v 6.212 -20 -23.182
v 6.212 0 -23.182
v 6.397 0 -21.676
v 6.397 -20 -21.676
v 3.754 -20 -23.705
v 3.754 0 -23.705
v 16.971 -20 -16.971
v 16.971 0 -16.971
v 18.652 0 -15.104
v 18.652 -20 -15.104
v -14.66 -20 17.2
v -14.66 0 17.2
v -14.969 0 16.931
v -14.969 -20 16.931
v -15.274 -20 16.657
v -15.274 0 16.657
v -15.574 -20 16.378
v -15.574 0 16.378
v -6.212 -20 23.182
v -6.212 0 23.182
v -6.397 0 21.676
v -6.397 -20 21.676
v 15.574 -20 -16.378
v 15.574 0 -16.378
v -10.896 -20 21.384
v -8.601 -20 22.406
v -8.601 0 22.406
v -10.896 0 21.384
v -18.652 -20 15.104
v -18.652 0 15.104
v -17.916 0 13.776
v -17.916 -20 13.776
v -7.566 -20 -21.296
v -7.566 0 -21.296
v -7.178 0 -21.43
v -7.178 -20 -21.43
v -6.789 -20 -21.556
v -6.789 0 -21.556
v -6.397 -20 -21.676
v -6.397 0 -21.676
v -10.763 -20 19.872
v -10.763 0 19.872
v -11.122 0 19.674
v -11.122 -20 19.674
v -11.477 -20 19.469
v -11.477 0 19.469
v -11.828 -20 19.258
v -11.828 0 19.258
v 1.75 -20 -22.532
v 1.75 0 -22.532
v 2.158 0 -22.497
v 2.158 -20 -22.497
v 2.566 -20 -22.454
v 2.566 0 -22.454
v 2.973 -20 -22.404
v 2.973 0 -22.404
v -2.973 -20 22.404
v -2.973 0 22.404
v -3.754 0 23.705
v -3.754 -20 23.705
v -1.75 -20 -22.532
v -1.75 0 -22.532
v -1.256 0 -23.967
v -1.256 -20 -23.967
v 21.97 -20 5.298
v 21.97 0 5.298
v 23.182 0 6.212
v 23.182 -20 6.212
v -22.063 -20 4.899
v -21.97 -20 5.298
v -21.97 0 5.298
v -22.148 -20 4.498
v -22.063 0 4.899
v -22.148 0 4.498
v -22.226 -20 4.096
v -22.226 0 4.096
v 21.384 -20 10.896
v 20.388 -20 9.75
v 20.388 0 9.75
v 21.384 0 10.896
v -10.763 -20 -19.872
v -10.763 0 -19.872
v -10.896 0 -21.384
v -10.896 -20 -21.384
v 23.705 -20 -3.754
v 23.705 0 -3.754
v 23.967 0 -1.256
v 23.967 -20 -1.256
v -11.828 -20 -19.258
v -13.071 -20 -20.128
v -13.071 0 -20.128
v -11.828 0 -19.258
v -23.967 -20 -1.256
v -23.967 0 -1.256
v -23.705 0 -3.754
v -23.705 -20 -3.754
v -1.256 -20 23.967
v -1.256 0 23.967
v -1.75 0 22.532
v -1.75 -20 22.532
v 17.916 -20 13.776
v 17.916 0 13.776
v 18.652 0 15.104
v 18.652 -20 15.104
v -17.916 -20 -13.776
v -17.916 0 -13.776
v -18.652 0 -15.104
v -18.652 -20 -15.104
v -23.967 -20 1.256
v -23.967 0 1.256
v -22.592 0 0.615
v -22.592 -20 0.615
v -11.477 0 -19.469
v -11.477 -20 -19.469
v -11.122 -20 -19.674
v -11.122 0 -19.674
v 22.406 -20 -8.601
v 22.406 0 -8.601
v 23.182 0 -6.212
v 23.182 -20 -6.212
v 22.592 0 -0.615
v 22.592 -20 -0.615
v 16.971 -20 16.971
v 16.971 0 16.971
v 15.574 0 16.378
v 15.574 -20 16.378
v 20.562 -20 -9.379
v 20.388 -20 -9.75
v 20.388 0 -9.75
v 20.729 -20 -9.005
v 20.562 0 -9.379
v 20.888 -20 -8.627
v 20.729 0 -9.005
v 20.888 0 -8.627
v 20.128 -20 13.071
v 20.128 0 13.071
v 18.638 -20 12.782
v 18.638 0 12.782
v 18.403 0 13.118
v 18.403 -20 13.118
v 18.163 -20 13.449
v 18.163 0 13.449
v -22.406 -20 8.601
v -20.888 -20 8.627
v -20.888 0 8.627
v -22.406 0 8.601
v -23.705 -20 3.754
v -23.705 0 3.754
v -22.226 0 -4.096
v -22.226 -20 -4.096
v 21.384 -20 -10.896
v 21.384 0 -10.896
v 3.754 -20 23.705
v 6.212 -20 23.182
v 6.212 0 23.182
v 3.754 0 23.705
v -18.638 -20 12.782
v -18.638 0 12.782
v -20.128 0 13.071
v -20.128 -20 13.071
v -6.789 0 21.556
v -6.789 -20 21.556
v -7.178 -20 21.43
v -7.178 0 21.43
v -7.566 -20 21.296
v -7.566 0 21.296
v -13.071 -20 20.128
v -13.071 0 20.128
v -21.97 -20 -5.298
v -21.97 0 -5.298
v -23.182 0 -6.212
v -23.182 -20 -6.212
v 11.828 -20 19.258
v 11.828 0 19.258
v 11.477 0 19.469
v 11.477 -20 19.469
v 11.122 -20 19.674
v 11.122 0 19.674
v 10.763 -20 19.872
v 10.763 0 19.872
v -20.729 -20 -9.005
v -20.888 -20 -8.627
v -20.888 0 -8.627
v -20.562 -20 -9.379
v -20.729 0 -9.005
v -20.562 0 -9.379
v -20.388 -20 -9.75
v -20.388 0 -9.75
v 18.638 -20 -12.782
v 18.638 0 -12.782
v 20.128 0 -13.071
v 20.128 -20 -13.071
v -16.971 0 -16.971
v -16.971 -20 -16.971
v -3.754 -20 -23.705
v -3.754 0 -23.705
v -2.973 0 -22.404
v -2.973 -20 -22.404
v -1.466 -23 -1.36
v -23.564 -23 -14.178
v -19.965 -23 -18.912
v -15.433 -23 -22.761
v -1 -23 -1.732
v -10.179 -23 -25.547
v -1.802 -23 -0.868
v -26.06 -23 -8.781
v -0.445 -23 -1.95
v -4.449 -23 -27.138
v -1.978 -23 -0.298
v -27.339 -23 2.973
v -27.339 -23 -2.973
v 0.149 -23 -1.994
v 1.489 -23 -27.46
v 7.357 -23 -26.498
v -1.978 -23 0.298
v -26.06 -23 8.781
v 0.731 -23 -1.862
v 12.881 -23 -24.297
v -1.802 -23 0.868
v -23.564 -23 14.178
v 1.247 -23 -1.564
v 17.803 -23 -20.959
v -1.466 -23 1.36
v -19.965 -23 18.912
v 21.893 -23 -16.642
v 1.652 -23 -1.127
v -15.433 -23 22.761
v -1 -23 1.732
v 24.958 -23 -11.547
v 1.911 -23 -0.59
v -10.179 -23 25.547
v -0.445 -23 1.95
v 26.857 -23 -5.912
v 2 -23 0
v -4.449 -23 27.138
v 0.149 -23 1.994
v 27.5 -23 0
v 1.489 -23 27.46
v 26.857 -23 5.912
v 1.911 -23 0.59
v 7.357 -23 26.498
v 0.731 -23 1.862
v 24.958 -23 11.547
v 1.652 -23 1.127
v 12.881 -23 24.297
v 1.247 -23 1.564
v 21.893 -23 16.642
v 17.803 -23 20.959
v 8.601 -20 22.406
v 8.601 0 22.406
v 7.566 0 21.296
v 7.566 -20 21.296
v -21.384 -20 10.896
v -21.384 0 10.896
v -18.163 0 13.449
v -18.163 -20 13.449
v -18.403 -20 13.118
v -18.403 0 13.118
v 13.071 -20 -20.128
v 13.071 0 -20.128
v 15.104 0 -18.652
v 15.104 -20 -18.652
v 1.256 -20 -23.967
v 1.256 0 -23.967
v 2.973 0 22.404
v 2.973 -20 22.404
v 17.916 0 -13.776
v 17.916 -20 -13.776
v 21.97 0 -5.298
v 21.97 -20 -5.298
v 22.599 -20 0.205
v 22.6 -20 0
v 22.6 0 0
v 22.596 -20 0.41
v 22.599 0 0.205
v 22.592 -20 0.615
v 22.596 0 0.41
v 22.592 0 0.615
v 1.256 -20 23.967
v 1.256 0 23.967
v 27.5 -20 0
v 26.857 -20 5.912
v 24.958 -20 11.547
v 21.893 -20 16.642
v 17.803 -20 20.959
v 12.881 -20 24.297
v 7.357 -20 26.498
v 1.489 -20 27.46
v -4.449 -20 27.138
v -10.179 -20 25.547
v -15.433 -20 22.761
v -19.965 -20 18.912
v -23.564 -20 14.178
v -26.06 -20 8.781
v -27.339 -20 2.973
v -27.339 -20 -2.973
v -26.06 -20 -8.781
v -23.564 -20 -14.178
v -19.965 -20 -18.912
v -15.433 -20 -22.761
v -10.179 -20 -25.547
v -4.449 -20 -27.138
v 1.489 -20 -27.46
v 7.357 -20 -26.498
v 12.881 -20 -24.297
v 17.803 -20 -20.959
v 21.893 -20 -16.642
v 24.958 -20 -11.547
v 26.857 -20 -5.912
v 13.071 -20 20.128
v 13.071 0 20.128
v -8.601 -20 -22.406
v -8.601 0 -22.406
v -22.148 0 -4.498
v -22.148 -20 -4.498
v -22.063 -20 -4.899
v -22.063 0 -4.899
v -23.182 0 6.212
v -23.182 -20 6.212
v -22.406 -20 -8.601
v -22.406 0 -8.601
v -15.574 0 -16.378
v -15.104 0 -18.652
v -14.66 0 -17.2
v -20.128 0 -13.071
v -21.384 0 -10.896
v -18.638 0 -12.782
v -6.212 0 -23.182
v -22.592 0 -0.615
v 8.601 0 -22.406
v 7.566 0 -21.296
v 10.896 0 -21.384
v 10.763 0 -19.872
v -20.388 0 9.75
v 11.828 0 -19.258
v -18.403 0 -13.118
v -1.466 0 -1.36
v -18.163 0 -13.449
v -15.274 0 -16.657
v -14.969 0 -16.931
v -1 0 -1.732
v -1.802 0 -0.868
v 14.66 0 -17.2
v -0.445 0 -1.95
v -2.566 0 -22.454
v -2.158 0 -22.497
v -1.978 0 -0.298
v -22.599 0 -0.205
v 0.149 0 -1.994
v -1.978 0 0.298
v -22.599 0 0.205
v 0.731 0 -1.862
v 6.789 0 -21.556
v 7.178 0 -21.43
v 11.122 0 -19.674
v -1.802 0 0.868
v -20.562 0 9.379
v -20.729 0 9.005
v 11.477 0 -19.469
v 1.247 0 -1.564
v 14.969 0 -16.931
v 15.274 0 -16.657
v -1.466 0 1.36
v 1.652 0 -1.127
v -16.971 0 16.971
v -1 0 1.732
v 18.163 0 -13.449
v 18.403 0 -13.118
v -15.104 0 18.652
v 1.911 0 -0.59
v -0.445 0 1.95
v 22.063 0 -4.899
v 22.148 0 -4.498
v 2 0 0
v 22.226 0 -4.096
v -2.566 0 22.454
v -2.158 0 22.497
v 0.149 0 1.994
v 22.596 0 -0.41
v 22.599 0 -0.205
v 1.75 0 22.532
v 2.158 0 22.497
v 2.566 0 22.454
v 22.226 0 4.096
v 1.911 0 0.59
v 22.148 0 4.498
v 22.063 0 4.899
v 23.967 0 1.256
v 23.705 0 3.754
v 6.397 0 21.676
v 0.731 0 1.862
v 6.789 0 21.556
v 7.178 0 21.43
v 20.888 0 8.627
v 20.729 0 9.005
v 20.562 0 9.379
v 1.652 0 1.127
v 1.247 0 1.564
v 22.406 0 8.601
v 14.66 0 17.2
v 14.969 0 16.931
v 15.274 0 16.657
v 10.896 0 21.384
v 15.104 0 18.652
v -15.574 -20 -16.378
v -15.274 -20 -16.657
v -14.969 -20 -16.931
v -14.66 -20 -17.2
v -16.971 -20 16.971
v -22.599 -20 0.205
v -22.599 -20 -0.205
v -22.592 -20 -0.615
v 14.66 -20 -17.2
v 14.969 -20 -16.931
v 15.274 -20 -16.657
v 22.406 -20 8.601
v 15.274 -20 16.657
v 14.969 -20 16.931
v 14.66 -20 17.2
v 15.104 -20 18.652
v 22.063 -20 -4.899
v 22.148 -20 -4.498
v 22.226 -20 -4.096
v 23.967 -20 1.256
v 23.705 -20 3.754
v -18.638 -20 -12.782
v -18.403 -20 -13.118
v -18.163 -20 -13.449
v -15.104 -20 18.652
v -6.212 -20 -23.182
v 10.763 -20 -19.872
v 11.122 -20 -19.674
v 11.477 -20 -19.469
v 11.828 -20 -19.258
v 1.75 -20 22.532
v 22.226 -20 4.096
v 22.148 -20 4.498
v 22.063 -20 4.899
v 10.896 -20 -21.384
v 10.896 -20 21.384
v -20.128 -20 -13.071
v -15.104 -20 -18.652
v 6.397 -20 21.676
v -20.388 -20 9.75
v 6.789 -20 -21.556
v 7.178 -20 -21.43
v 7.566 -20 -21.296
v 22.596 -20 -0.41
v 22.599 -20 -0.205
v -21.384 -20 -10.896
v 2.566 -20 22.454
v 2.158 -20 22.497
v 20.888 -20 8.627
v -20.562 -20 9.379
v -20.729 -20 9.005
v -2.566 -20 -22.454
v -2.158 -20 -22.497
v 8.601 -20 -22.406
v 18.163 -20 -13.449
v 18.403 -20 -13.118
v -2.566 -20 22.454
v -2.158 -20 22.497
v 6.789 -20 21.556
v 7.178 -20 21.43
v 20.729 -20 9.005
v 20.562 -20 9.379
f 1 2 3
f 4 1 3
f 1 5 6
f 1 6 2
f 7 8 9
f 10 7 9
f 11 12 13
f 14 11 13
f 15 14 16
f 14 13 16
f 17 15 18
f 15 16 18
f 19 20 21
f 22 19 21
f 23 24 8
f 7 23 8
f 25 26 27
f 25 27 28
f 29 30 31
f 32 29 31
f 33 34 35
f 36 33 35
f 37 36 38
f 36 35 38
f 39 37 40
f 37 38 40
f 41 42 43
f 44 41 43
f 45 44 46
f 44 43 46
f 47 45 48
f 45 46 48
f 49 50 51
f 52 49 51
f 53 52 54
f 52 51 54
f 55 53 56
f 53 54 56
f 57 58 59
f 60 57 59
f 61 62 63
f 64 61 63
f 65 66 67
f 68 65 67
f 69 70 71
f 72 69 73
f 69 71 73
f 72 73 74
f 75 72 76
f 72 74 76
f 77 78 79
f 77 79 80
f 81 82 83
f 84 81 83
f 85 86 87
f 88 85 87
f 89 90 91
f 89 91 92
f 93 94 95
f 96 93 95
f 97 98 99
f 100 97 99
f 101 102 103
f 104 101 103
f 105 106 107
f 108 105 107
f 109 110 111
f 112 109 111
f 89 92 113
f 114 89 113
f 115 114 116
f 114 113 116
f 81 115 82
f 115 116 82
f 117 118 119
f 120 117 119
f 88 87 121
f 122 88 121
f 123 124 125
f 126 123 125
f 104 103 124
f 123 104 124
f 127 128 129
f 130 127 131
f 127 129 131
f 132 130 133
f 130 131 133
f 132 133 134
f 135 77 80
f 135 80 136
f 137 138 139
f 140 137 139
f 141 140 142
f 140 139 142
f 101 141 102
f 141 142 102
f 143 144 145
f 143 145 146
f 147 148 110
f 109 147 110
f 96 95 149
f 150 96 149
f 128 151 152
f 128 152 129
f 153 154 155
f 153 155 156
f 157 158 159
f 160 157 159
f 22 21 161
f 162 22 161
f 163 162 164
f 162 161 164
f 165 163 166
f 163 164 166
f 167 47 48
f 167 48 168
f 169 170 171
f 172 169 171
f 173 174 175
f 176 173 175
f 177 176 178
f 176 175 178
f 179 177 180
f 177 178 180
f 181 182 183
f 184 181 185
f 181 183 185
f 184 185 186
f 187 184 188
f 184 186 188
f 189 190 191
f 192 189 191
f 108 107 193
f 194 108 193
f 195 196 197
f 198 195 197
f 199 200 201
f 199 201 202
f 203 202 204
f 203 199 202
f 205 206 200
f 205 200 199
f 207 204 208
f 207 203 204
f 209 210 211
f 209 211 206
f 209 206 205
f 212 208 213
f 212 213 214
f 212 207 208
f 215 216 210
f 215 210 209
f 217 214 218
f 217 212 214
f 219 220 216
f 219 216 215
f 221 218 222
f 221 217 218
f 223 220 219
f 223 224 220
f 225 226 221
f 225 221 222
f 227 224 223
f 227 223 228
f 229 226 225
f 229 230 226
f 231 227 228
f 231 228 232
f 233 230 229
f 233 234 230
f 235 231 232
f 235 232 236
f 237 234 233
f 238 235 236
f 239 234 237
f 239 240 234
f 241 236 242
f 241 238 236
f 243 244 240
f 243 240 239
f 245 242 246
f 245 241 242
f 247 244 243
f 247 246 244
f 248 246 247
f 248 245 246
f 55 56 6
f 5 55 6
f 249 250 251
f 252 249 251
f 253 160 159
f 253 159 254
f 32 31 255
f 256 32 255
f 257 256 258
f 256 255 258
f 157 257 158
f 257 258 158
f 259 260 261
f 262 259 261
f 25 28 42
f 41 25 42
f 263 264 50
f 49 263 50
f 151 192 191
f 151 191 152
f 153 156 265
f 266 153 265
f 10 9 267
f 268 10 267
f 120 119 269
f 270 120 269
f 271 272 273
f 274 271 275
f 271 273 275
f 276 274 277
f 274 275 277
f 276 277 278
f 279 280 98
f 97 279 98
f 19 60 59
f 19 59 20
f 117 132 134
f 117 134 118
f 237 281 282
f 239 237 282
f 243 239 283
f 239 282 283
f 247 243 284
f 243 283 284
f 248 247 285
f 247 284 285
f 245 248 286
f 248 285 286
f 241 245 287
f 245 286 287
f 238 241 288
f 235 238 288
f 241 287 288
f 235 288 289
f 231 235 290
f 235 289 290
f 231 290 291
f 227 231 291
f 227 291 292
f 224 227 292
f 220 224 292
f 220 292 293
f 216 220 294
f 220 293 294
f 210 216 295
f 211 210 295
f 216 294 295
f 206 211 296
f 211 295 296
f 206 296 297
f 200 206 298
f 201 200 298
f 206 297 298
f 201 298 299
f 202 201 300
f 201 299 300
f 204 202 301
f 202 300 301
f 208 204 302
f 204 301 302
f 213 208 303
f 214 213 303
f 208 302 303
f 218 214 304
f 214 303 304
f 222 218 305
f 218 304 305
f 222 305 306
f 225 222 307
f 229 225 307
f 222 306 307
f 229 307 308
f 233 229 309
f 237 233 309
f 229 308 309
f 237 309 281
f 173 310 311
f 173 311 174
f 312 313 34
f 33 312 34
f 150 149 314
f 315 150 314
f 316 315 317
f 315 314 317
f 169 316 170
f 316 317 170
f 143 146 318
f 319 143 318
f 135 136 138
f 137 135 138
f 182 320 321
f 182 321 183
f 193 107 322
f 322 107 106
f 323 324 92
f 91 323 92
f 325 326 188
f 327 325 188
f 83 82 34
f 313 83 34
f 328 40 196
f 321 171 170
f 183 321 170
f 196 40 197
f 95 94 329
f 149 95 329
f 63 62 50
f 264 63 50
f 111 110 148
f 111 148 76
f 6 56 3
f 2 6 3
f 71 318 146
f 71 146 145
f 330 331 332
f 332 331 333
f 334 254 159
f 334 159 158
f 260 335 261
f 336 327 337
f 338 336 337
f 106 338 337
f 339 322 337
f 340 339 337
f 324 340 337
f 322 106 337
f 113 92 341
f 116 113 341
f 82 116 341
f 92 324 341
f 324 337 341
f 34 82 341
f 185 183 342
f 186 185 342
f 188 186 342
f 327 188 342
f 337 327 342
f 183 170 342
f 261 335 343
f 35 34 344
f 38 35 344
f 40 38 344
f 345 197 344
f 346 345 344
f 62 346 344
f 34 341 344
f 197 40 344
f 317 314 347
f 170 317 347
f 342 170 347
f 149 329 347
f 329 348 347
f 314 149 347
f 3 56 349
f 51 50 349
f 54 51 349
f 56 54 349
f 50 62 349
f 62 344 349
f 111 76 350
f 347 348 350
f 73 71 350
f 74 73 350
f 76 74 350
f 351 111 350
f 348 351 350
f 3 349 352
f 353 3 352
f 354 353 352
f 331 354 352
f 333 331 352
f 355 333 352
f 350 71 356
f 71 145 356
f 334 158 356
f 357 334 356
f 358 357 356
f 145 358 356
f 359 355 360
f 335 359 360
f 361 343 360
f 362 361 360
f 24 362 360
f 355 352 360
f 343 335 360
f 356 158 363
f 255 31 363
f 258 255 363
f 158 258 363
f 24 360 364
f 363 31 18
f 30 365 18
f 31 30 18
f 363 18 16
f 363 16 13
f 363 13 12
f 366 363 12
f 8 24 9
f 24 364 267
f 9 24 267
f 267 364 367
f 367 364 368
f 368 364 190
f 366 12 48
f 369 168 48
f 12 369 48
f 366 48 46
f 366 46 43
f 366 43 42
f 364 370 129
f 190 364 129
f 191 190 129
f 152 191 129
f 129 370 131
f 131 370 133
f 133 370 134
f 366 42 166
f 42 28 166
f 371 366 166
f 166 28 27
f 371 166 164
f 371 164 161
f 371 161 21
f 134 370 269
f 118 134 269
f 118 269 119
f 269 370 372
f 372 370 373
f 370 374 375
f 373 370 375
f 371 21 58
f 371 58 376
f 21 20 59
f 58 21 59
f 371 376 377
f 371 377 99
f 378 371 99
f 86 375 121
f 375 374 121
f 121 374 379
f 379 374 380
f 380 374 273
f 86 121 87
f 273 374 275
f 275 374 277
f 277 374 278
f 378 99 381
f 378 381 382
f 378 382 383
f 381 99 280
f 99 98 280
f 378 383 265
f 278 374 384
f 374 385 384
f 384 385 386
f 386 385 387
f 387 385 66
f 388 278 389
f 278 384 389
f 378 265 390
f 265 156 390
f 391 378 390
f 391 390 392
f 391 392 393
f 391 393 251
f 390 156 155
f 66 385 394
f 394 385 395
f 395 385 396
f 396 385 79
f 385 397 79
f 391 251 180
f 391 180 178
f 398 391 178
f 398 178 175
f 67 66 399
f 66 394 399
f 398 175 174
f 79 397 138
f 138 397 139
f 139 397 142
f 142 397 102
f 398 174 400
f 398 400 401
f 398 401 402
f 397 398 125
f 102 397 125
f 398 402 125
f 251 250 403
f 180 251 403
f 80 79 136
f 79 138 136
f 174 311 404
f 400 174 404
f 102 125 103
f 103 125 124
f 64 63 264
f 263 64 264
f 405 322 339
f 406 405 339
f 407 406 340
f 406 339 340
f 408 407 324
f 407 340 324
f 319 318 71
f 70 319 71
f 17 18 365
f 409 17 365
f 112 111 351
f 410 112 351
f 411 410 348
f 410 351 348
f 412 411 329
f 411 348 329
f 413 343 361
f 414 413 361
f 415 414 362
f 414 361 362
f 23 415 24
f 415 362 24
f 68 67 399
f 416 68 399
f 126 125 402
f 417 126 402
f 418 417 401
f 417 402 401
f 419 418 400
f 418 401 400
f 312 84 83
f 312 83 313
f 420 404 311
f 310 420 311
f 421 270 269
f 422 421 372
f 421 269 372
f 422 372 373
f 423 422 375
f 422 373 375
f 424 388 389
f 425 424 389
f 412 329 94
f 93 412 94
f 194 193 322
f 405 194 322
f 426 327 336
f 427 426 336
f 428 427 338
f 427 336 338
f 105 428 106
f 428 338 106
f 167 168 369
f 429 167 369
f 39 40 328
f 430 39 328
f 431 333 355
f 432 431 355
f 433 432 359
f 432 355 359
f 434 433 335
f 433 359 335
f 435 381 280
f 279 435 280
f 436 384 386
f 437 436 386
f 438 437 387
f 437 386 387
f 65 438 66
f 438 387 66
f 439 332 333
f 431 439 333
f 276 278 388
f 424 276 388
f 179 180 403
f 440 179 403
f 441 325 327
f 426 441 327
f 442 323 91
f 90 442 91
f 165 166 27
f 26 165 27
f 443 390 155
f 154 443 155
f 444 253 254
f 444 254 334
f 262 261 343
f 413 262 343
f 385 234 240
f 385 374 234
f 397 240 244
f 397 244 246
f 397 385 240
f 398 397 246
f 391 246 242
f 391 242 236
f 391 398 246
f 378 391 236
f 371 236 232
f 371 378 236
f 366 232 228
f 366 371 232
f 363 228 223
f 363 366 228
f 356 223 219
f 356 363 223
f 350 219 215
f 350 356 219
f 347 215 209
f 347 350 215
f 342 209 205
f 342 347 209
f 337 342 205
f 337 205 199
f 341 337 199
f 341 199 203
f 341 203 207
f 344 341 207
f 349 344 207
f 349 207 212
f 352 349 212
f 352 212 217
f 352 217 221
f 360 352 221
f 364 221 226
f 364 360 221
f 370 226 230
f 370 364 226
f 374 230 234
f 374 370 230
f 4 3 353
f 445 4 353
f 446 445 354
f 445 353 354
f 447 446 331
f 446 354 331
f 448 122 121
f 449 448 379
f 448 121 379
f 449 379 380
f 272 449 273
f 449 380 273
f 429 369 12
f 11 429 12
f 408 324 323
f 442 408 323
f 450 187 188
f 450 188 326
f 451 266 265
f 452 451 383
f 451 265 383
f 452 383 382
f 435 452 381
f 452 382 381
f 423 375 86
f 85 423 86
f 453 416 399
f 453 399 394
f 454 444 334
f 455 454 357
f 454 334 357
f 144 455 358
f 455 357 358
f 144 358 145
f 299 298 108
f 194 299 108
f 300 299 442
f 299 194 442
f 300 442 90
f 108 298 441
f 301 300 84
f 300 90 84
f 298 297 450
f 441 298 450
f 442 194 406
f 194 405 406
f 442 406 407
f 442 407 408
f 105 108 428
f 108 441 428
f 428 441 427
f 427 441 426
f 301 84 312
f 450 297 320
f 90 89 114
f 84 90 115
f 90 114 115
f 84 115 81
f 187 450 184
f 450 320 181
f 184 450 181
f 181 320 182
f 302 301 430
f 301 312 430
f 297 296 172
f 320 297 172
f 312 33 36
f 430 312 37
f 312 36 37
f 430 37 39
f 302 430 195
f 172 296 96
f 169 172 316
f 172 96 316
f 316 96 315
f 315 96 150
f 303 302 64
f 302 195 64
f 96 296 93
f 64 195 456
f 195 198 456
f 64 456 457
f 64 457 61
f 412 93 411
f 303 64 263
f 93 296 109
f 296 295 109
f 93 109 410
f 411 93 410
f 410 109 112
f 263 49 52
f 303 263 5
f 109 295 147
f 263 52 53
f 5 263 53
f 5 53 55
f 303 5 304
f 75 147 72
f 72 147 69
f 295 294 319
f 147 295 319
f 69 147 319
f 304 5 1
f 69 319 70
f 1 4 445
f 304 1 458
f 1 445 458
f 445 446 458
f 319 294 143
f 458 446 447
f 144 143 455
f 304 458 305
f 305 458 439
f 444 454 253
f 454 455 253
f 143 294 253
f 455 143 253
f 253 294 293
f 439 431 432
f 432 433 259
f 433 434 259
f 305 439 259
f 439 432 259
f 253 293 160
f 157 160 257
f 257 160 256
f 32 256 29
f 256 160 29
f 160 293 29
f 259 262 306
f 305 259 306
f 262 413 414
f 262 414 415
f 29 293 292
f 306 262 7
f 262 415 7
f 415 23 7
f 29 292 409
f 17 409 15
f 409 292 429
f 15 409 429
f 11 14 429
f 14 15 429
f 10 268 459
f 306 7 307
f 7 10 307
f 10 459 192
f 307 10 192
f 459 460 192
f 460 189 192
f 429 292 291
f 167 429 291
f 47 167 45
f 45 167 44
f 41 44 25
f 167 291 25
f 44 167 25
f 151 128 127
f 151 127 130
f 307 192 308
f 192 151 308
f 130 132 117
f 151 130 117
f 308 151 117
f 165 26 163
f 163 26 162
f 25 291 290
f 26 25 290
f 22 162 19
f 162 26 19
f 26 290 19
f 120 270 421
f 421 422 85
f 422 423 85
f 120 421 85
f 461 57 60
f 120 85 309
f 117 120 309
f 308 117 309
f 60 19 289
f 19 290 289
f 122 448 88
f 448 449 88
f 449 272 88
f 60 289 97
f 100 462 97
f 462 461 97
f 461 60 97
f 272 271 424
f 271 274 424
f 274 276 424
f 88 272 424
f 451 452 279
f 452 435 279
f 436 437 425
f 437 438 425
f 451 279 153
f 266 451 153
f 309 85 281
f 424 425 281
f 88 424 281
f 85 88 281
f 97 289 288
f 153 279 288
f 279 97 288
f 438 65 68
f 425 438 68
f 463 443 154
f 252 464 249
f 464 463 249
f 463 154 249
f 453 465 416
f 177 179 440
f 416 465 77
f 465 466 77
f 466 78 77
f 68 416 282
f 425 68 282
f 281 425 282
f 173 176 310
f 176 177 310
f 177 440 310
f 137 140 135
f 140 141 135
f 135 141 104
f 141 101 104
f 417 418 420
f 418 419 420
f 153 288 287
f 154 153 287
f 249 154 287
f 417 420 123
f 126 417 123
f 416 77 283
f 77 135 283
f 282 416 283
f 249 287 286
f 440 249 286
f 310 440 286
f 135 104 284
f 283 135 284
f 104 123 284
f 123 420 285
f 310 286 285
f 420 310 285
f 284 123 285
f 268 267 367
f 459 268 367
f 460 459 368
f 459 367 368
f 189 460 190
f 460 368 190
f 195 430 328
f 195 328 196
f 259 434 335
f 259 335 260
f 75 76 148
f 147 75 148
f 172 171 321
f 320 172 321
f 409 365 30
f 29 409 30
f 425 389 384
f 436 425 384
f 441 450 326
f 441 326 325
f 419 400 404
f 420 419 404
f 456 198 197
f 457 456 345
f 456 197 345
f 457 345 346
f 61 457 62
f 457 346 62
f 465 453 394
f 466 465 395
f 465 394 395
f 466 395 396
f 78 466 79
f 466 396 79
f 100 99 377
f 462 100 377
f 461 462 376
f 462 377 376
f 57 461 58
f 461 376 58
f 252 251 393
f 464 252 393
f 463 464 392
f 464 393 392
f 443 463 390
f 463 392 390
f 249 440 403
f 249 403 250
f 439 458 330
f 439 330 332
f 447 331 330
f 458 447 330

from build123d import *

# Parameters (mm, degrees)
F0_R     = 2
F1_DEPTH = 20
F2_R     = 27.5
F2_R_2   = 2
F3_DEPTH = 3


with BuildPart() as f1:
    # F0 (on Front) → F1 (new body)
    with BuildSketch(Plane.XZ):
        with BuildLine():
            ThreePointArc((22.59164, -0.614671), (22.59791, -0.307364), (22.6, 0))
            ThreePointArc((22.6, 0), (22.59791, 0.307364), (22.59164, 0.614671))
            ThreePointArc((22.59164, 0.614671), (22.476195, 2.362343), (22.225755, 4.095827))
            ThreePointArc((22.225755, 4.095827), (22.106136, 4.698804), (21.970161, 5.298305))
            ThreePointArc((21.970161, 5.298305), (21.493877, 6.983784), (20.888499, 8.627318))
            ThreePointArc((20.888499, 8.627318), (20.646127, 9.192248), (20.38848, 9.750378))
            ThreePointArc((20.38848, 9.750378), (19.572174, 11.3), (18.638315, 12.781753))
            ThreePointArc((18.638315, 12.781753), (18.283784, 13.283947), (17.915726, 13.776312))
            ThreePointArc((17.915726, 13.776312), (16.795073, 15.122352), (15.573547, 16.377565))
            ThreePointArc((15.573547, 16.377565), (15.122352, 16.795073), (14.659968, 17.200155))
            ThreePointArc((14.659968, 17.200155), (13.283947, 18.283784), (11.828141, 19.257598))
            ThreePointArc((11.828141, 19.257598), (11.3, 19.572174), (10.763499, 19.872269))
            ThreePointArc((10.763499, 19.872269), (9.192248, 20.646127), (7.565788, 21.295982))
            ThreePointArc((7.565788, 21.295982), (6.983784, 21.493877), (6.396614, 21.67587))
            ThreePointArc((6.396614, 21.67587), (4.698804, 22.106136), (2.972773, 22.40363))
            ThreePointArc((2.972773, 22.40363), (2.362343, 22.476195), (1.750165, 22.532131))
            ThreePointArc((1.750165, 22.532131), (0, 22.6), (-1.750165, 22.532131))
            ThreePointArc((-1.750165, 22.532131), (-2.362343, 22.476195), (-2.972773, 22.40363))
            ThreePointArc((-2.972773, 22.40363), (-4.698804, 22.106136), (-6.396614, 21.67587))
            ThreePointArc((-6.396614, 21.67587), (-6.983784, 21.493877), (-7.565788, 21.295982))
            ThreePointArc((-7.565788, 21.295982), (-9.192248, 20.646127), (-10.763499, 19.872269))
            ThreePointArc((-10.763499, 19.872269), (-11.3, 19.572174), (-11.828141, 19.257598))
            ThreePointArc((-11.828141, 19.257598), (-13.283947, 18.283784), (-14.659968, 17.200155))
            ThreePointArc((-14.659968, 17.200155), (-15.122352, 16.795073), (-15.573547, 16.377565))
            ThreePointArc((-15.573547, 16.377565), (-16.795073, 15.122352), (-17.915726, 13.776312))
            ThreePointArc((-17.915726, 13.776312), (-18.283784, 13.283947), (-18.638315, 12.781753))
            ThreePointArc((-18.638315, 12.781753), (-19.572174, 11.3), (-20.38848, 9.750378))
            ThreePointArc((-20.38848, 9.750378), (-20.646127, 9.192248), (-20.888499, 8.627318))
            ThreePointArc((-20.888499, 8.627318), (-21.493877, 6.983784), (-21.970161, 5.298305))
            ThreePointArc((-21.970161, 5.298305), (-22.106136, 4.698804), (-22.225755, 4.095827))
            ThreePointArc((-22.225755, 4.095827), (-22.476195, 2.362343), (-22.59164, 0.614671))
            ThreePointArc((-22.59164, 0.614671), (-22.6, 0), (-22.59164, -0.614671))
            ThreePointArc((-22.59164, -0.614671), (-22.476195, -2.362343), (-22.225755, -4.095827))
            ThreePointArc((-22.225755, -4.095827), (-22.106136, -4.698804), (-21.970161, -5.298305))
            ThreePointArc((-21.970161, -5.298305), (-21.493877, -6.983784), (-20.888499, -8.627318))
            ThreePointArc((-20.888499, -8.627318), (-20.646127, -9.192248), (-20.38848, -9.750378))
            ThreePointArc((-20.38848, -9.750378), (-19.572174, -11.3), (-18.638315, -12.781753))
            ThreePointArc((-18.638315, -12.781753), (-18.283784, -13.283947), (-17.915726, -13.776312))
            ThreePointArc((-17.915726, -13.776312), (-16.795073, -15.122352), (-15.573547, -16.377565))
            ThreePointArc((-15.573547, -16.377565), (-15.122352, -16.795073), (-14.659968, -17.200155))
            ThreePointArc((-14.659968, -17.200155), (-13.283947, -18.283784), (-11.828141, -19.257598))
            ThreePointArc((-11.828141, -19.257598), (-11.3, -19.572174), (-10.763499, -19.872269))
            ThreePointArc((-10.763499, -19.872269), (-9.192248, -20.646127), (-7.565788, -21.295982))
            ThreePointArc((-7.565788, -21.295982), (-6.983784, -21.493877), (-6.396614, -21.67587))
            ThreePointArc((-6.396614, -21.67587), (-4.698804, -22.106136), (-2.972773, -22.40363))
            ThreePointArc((-2.972773, -22.40363), (-2.362343, -22.476195), (-1.750165, -22.532131))
            ThreePointArc((-1.750165, -22.532131), (0, -22.6), (1.750165, -22.532131))
            ThreePointArc((1.750165, -22.532131), (2.362343, -22.476195), (2.972773, -22.40363))
            ThreePointArc((2.972773, -22.40363), (4.698804, -22.106136), (6.396614, -21.67587))
            ThreePointArc((6.396614, -21.67587), (6.983784, -21.493877), (7.565788, -21.295982))
            ThreePointArc((7.565788, -21.295982), (9.192248, -20.646127), (10.763499, -19.872269))
            ThreePointArc((10.763499, -19.872269), (11.3, -19.572174), (11.828141, -19.257598))
            ThreePointArc((11.828141, -19.257598), (13.283947, -18.283784), (14.659968, -17.200155))
            ThreePointArc((14.659968, -17.200155), (15.122352, -16.795073), (15.573547, -16.377565))
            ThreePointArc((15.573547, -16.377565), (16.795073, -15.122352), (17.915726, -13.776312))
            ThreePointArc((17.915726, -13.776312), (18.283784, -13.283947), (18.638315, -12.781753))
            ThreePointArc((18.638315, -12.781753), (19.572174, -11.3), (20.38848, -9.750378))
            ThreePointArc((20.38848, -9.750378), (20.646127, -9.192248), (20.888499, -8.627318))
            ThreePointArc((20.888499, -8.627318), (21.493877, -6.983784), (21.970161, -5.298305))
            ThreePointArc((21.970161, -5.298305), (22.106136, -4.698804), (22.225755, -4.095827))
            ThreePointArc((22.225755, -4.095827), (22.476195, -2.362343), (22.59164, -0.614671))
        make_face()
        Circle(F0_R, mode=Mode.SUBTRACT)
        with BuildLine():
            ThreePointArc((22.225755, 4.095827), (22.476195, 2.362343), (22.59164, 0.614671))
            Line((22.59164, 0.614671), (23.967109, 1.256063))
            Line((23.967109, 1.256063), (23.70452, 3.754427))
            Line((23.70452, 3.754427), (22.225755, 4.095827))
        make_face()
        with BuildLine():
            Line((23.967109, -1.256063), (22.59164, -0.614671))
            ThreePointArc((22.59164, -0.614671), (22.476195, -2.362343), (22.225755, -4.095827))
            Line((22.225755, -4.095827), (23.70452, -3.754427))
            Line((23.70452, -3.754427), (23.967109, -1.256063))
        make_face()
        with BuildLine():
            ThreePointArc((20.888499, 8.627318), (21.493877, 6.983784), (21.970161, 5.298305))
            Line((21.970161, 5.298305), (23.18222, 6.211657))
            Line((23.18222, 6.211657), (22.40593, 8.600831))
            Line((22.40593, 8.600831), (20.888499, 8.627318))
        make_face()
        with BuildLine():
            Line((23.18222, -6.211657), (21.970161, -5.298305))
            ThreePointArc((21.970161, -5.298305), (21.493877, -6.983784), (20.888499, -8.627318))
            Line((20.888499, -8.627318), (22.40593, -8.600831))
            Line((22.40593, -8.600831), (23.18222, -6.211657))
        make_face()
        with BuildLine():
            ThreePointArc((18.638315, 12.781753), (19.572174, 11.3), (20.38848, 9.750378))
            Line((20.38848, 9.750378), (21.384157, 10.895772))
            Line((21.384157, 10.895772), (20.128094, 13.071337))
            Line((20.128094, 13.071337), (18.638315, 12.781753))
        make_face()
        with BuildLine():
            Line((21.384157, -10.895772), (20.38848, -9.750378))
            ThreePointArc((20.38848, -9.750378), (19.572174, -11.3), (18.638315, -12.781753))
            Line((18.638315, -12.781753), (20.128094, -13.071337))
            Line((20.128094, -13.071337), (21.384157, -10.895772))
        make_face()
        with BuildLine():
            ThreePointArc((15.573547, 16.377565), (16.795073, 15.122352), (17.915726, 13.776312))
            Line((17.915726, 13.776312), (18.651503, 15.103689))
            Line((18.651503, 15.103689), (16.970563, 16.970563))
            Line((16.970563, 16.970563), (15.573547, 16.377565))
        make_face()
        with BuildLine():
            Line((18.651503, -15.103689), (17.915726, -13.776312))
            ThreePointArc((17.915726, -13.776312), (16.795073, -15.122352), (15.573547, -16.377565))
            Line((15.573547, -16.377565), (16.970563, -16.970563))
            Line((16.970563, -16.970563), (18.651503, -15.103689))
        make_face()
        with BuildLine():
            ThreePointArc((11.828141, 19.257598), (13.283947, 18.283784), (14.659968, 17.200155))
            Line((14.659968, 17.200155), (15.103689, 18.651503))
            Line((15.103689, 18.651503), (13.071337, 20.128094))
            Line((13.071337, 20.128094), (11.828141, 19.257598))
        make_face()
        with BuildLine():
            Line((15.103689, -18.651503), (14.659968, -17.200155))
            ThreePointArc((14.659968, -17.200155), (13.283947, -18.283784), (11.828141, -19.257598))
            Line((11.828141, -19.257598), (13.071337, -20.128094))
            Line((13.071337, -20.128094), (15.103689, -18.651503))
        make_face()
        with BuildLine():
            ThreePointArc((7.565788, 21.295982), (9.192248, 20.646127), (10.763499, 19.872269))
            Line((10.763499, 19.872269), (10.895772, 21.384157))
            Line((10.895772, 21.384157), (8.600831, 22.40593))
            Line((8.600831, 22.40593), (7.565788, 21.295982))
        make_face()
        with BuildLine():
            Line((10.895772, -21.384157), (10.763499, -19.872269))
            ThreePointArc((10.763499, -19.872269), (9.192248, -20.646127), (7.565788, -21.295982))
            Line((7.565788, -21.295982), (8.600831, -22.40593))
            Line((8.600831, -22.40593), (10.895772, -21.384157))
        make_face()
        with BuildLine():
            ThreePointArc((2.972773, 22.40363), (4.698804, 22.106136), (6.396614, 21.67587))
            Line((6.396614, 21.67587), (6.211657, 23.18222))
            Line((6.211657, 23.18222), (3.754427, 23.70452))
            Line((3.754427, 23.70452), (2.972773, 22.40363))
        make_face()
        with BuildLine():
            Line((6.211657, -23.18222), (6.396614, -21.67587))
            ThreePointArc((6.396614, -21.67587), (4.698804, -22.106136), (2.972773, -22.40363))
            Line((2.972773, -22.40363), (3.754427, -23.70452))
            Line((3.754427, -23.70452), (6.211657, -23.18222))
        make_face()
        with BuildLine():
            ThreePointArc((-1.750165, 22.532131), (0, 22.6), (1.750165, 22.532131))
            Line((1.750165, 22.532131), (1.256063, 23.967109))
            Line((1.256063, 23.967109), (-1.256063, 23.967109))
            Line((-1.256063, 23.967109), (-1.750165, 22.532131))
        make_face()
        with BuildLine():
            Line((1.256063, -23.967109), (1.750165, -22.532131))
            ThreePointArc((1.750165, -22.532131), (0, -22.6), (-1.750165, -22.532131))
            Line((-1.750165, -22.532131), (-1.256063, -23.967109))
            Line((-1.256063, -23.967109), (1.256063, -23.967109))
        make_face()
        with BuildLine():
            ThreePointArc((-6.396614, 21.67587), (-4.698804, 22.106136), (-2.972773, 22.40363))
            Line((-2.972773, 22.40363), (-3.754427, 23.70452))
            Line((-3.754427, 23.70452), (-6.211657, 23.18222))
            Line((-6.211657, 23.18222), (-6.396614, 21.67587))
        make_face()
        with BuildLine():
            Line((-3.754427, -23.70452), (-2.972773, -22.40363))
            ThreePointArc((-2.972773, -22.40363), (-4.698804, -22.106136), (-6.396614, -21.67587))
            Line((-6.396614, -21.67587), (-6.211657, -23.18222))
            Line((-6.211657, -23.18222), (-3.754427, -23.70452))
        make_face()
        with BuildLine():
            ThreePointArc((-10.763499, 19.872269), (-9.192248, 20.646127), (-7.565788, 21.295982))
            Line((-7.565788, 21.295982), (-8.600831, 22.40593))
            Line((-8.600831, 22.40593), (-10.895772, 21.384157))
            Line((-10.895772, 21.384157), (-10.763499, 19.872269))
        make_face()
        with BuildLine():
            Line((-8.600831, -22.40593), (-7.565788, -21.295982))
            ThreePointArc((-7.565788, -21.295982), (-9.192248, -20.646127), (-10.763499, -19.872269))
            Line((-10.763499, -19.872269), (-10.895772, -21.384157))
            Line((-10.895772, -21.384157), (-8.600831, -22.40593))
        make_face()
        with BuildLine():
            ThreePointArc((-14.659968, 17.200155), (-13.283947, 18.283784), (-11.828141, 19.257598))
            Line((-11.828141, 19.257598), (-13.071337, 20.128094))
            Line((-13.071337, 20.128094), (-15.103689, 18.651503))
            Line((-15.103689, 18.651503), (-14.659968, 17.200155))
        make_face()
        with BuildLine():
            Line((-13.071337, -20.128094), (-11.828141, -19.257598))
            ThreePointArc((-11.828141, -19.257598), (-13.283947, -18.283784), (-14.659968, -17.200155))
            Line((-14.659968, -17.200155), (-15.103689, -18.651503))
            Line((-15.103689, -18.651503), (-13.071337, -20.128094))
        make_face()
        with BuildLine():
            ThreePointArc((-17.915726, 13.776312), (-16.795073, 15.122352), (-15.573547, 16.377565))
            Line((-15.573547, 16.377565), (-16.970563, 16.970563))
            Line((-16.970563, 16.970563), (-18.651503, 15.103689))
            Line((-18.651503, 15.103689), (-17.915726, 13.776312))
        make_face()
        with BuildLine():
            Line((-16.970563, -16.970563), (-15.573547, -16.377565))
            ThreePointArc((-15.573547, -16.377565), (-16.795073, -15.122352), (-17.915726, -13.776312))
            Line((-17.915726, -13.776312), (-18.651503, -15.103689))
            Line((-18.651503, -15.103689), (-16.970563, -16.970563))
        make_face()
        with BuildLine():
            ThreePointArc((-20.38848, 9.750378), (-19.572174, 11.3), (-18.638315, 12.781753))
            Line((-18.638315, 12.781753), (-20.128094, 13.071337))
            Line((-20.128094, 13.071337), (-21.384157, 10.895772))
            Line((-21.384157, 10.895772), (-20.38848, 9.750378))
        make_face()
        with BuildLine():
            Line((-20.128094, -13.071337), (-18.638315, -12.781753))
            ThreePointArc((-18.638315, -12.781753), (-19.572174, -11.3), (-20.38848, -9.750378))
            Line((-20.38848, -9.750378), (-21.384157, -10.895772))
            Line((-21.384157, -10.895772), (-20.128094, -13.071337))
        make_face()
        with BuildLine():
            ThreePointArc((-21.970161, 5.298305), (-21.493877, 6.983784), (-20.888499, 8.627318))
            Line((-20.888499, 8.627318), (-22.40593, 8.600831))
            Line((-22.40593, 8.600831), (-23.18222, 6.211657))
            Line((-23.18222, 6.211657), (-21.970161, 5.298305))
        make_face()
        with BuildLine():
            Line((-22.40593, -8.600831), (-20.888499, -8.627318))
            ThreePointArc((-20.888499, -8.627318), (-21.493877, -6.983784), (-21.970161, -5.298305))
            Line((-21.970161, -5.298305), (-23.18222, -6.211657))
            Line((-23.18222, -6.211657), (-22.40593, -8.600831))
        make_face()
        with BuildLine():
            ThreePointArc((-22.59164, 0.614671), (-22.476195, 2.362343), (-22.225755, 4.095827))
            Line((-22.225755, 4.095827), (-23.70452, 3.754427))
            Line((-23.70452, 3.754427), (-23.967109, 1.256063))
            Line((-23.967109, 1.256063), (-22.59164, 0.614671))
        make_face()
        with BuildLine():
            Line((-23.70452, -3.754427), (-22.225755, -4.095827))
            ThreePointArc((-22.225755, -4.095827), (-22.476195, -2.362343), (-22.59164, -0.614671))
            Line((-22.59164, -0.614671), (-23.967109, -1.256063))
            Line((-23.967109, -1.256063), (-23.70452, -3.754427))
        make_face()
    extrude(amount=F1_DEPTH)

    # F2 (on face) → F3 (join)
    with BuildSketch(Plane.XZ.offset(20)):
        Circle(F2_R)
        Circle(F2_R_2, mode=Mode.SUBTRACT)
    extrude(amount=F3_DEPTH)


solid = f1.part
